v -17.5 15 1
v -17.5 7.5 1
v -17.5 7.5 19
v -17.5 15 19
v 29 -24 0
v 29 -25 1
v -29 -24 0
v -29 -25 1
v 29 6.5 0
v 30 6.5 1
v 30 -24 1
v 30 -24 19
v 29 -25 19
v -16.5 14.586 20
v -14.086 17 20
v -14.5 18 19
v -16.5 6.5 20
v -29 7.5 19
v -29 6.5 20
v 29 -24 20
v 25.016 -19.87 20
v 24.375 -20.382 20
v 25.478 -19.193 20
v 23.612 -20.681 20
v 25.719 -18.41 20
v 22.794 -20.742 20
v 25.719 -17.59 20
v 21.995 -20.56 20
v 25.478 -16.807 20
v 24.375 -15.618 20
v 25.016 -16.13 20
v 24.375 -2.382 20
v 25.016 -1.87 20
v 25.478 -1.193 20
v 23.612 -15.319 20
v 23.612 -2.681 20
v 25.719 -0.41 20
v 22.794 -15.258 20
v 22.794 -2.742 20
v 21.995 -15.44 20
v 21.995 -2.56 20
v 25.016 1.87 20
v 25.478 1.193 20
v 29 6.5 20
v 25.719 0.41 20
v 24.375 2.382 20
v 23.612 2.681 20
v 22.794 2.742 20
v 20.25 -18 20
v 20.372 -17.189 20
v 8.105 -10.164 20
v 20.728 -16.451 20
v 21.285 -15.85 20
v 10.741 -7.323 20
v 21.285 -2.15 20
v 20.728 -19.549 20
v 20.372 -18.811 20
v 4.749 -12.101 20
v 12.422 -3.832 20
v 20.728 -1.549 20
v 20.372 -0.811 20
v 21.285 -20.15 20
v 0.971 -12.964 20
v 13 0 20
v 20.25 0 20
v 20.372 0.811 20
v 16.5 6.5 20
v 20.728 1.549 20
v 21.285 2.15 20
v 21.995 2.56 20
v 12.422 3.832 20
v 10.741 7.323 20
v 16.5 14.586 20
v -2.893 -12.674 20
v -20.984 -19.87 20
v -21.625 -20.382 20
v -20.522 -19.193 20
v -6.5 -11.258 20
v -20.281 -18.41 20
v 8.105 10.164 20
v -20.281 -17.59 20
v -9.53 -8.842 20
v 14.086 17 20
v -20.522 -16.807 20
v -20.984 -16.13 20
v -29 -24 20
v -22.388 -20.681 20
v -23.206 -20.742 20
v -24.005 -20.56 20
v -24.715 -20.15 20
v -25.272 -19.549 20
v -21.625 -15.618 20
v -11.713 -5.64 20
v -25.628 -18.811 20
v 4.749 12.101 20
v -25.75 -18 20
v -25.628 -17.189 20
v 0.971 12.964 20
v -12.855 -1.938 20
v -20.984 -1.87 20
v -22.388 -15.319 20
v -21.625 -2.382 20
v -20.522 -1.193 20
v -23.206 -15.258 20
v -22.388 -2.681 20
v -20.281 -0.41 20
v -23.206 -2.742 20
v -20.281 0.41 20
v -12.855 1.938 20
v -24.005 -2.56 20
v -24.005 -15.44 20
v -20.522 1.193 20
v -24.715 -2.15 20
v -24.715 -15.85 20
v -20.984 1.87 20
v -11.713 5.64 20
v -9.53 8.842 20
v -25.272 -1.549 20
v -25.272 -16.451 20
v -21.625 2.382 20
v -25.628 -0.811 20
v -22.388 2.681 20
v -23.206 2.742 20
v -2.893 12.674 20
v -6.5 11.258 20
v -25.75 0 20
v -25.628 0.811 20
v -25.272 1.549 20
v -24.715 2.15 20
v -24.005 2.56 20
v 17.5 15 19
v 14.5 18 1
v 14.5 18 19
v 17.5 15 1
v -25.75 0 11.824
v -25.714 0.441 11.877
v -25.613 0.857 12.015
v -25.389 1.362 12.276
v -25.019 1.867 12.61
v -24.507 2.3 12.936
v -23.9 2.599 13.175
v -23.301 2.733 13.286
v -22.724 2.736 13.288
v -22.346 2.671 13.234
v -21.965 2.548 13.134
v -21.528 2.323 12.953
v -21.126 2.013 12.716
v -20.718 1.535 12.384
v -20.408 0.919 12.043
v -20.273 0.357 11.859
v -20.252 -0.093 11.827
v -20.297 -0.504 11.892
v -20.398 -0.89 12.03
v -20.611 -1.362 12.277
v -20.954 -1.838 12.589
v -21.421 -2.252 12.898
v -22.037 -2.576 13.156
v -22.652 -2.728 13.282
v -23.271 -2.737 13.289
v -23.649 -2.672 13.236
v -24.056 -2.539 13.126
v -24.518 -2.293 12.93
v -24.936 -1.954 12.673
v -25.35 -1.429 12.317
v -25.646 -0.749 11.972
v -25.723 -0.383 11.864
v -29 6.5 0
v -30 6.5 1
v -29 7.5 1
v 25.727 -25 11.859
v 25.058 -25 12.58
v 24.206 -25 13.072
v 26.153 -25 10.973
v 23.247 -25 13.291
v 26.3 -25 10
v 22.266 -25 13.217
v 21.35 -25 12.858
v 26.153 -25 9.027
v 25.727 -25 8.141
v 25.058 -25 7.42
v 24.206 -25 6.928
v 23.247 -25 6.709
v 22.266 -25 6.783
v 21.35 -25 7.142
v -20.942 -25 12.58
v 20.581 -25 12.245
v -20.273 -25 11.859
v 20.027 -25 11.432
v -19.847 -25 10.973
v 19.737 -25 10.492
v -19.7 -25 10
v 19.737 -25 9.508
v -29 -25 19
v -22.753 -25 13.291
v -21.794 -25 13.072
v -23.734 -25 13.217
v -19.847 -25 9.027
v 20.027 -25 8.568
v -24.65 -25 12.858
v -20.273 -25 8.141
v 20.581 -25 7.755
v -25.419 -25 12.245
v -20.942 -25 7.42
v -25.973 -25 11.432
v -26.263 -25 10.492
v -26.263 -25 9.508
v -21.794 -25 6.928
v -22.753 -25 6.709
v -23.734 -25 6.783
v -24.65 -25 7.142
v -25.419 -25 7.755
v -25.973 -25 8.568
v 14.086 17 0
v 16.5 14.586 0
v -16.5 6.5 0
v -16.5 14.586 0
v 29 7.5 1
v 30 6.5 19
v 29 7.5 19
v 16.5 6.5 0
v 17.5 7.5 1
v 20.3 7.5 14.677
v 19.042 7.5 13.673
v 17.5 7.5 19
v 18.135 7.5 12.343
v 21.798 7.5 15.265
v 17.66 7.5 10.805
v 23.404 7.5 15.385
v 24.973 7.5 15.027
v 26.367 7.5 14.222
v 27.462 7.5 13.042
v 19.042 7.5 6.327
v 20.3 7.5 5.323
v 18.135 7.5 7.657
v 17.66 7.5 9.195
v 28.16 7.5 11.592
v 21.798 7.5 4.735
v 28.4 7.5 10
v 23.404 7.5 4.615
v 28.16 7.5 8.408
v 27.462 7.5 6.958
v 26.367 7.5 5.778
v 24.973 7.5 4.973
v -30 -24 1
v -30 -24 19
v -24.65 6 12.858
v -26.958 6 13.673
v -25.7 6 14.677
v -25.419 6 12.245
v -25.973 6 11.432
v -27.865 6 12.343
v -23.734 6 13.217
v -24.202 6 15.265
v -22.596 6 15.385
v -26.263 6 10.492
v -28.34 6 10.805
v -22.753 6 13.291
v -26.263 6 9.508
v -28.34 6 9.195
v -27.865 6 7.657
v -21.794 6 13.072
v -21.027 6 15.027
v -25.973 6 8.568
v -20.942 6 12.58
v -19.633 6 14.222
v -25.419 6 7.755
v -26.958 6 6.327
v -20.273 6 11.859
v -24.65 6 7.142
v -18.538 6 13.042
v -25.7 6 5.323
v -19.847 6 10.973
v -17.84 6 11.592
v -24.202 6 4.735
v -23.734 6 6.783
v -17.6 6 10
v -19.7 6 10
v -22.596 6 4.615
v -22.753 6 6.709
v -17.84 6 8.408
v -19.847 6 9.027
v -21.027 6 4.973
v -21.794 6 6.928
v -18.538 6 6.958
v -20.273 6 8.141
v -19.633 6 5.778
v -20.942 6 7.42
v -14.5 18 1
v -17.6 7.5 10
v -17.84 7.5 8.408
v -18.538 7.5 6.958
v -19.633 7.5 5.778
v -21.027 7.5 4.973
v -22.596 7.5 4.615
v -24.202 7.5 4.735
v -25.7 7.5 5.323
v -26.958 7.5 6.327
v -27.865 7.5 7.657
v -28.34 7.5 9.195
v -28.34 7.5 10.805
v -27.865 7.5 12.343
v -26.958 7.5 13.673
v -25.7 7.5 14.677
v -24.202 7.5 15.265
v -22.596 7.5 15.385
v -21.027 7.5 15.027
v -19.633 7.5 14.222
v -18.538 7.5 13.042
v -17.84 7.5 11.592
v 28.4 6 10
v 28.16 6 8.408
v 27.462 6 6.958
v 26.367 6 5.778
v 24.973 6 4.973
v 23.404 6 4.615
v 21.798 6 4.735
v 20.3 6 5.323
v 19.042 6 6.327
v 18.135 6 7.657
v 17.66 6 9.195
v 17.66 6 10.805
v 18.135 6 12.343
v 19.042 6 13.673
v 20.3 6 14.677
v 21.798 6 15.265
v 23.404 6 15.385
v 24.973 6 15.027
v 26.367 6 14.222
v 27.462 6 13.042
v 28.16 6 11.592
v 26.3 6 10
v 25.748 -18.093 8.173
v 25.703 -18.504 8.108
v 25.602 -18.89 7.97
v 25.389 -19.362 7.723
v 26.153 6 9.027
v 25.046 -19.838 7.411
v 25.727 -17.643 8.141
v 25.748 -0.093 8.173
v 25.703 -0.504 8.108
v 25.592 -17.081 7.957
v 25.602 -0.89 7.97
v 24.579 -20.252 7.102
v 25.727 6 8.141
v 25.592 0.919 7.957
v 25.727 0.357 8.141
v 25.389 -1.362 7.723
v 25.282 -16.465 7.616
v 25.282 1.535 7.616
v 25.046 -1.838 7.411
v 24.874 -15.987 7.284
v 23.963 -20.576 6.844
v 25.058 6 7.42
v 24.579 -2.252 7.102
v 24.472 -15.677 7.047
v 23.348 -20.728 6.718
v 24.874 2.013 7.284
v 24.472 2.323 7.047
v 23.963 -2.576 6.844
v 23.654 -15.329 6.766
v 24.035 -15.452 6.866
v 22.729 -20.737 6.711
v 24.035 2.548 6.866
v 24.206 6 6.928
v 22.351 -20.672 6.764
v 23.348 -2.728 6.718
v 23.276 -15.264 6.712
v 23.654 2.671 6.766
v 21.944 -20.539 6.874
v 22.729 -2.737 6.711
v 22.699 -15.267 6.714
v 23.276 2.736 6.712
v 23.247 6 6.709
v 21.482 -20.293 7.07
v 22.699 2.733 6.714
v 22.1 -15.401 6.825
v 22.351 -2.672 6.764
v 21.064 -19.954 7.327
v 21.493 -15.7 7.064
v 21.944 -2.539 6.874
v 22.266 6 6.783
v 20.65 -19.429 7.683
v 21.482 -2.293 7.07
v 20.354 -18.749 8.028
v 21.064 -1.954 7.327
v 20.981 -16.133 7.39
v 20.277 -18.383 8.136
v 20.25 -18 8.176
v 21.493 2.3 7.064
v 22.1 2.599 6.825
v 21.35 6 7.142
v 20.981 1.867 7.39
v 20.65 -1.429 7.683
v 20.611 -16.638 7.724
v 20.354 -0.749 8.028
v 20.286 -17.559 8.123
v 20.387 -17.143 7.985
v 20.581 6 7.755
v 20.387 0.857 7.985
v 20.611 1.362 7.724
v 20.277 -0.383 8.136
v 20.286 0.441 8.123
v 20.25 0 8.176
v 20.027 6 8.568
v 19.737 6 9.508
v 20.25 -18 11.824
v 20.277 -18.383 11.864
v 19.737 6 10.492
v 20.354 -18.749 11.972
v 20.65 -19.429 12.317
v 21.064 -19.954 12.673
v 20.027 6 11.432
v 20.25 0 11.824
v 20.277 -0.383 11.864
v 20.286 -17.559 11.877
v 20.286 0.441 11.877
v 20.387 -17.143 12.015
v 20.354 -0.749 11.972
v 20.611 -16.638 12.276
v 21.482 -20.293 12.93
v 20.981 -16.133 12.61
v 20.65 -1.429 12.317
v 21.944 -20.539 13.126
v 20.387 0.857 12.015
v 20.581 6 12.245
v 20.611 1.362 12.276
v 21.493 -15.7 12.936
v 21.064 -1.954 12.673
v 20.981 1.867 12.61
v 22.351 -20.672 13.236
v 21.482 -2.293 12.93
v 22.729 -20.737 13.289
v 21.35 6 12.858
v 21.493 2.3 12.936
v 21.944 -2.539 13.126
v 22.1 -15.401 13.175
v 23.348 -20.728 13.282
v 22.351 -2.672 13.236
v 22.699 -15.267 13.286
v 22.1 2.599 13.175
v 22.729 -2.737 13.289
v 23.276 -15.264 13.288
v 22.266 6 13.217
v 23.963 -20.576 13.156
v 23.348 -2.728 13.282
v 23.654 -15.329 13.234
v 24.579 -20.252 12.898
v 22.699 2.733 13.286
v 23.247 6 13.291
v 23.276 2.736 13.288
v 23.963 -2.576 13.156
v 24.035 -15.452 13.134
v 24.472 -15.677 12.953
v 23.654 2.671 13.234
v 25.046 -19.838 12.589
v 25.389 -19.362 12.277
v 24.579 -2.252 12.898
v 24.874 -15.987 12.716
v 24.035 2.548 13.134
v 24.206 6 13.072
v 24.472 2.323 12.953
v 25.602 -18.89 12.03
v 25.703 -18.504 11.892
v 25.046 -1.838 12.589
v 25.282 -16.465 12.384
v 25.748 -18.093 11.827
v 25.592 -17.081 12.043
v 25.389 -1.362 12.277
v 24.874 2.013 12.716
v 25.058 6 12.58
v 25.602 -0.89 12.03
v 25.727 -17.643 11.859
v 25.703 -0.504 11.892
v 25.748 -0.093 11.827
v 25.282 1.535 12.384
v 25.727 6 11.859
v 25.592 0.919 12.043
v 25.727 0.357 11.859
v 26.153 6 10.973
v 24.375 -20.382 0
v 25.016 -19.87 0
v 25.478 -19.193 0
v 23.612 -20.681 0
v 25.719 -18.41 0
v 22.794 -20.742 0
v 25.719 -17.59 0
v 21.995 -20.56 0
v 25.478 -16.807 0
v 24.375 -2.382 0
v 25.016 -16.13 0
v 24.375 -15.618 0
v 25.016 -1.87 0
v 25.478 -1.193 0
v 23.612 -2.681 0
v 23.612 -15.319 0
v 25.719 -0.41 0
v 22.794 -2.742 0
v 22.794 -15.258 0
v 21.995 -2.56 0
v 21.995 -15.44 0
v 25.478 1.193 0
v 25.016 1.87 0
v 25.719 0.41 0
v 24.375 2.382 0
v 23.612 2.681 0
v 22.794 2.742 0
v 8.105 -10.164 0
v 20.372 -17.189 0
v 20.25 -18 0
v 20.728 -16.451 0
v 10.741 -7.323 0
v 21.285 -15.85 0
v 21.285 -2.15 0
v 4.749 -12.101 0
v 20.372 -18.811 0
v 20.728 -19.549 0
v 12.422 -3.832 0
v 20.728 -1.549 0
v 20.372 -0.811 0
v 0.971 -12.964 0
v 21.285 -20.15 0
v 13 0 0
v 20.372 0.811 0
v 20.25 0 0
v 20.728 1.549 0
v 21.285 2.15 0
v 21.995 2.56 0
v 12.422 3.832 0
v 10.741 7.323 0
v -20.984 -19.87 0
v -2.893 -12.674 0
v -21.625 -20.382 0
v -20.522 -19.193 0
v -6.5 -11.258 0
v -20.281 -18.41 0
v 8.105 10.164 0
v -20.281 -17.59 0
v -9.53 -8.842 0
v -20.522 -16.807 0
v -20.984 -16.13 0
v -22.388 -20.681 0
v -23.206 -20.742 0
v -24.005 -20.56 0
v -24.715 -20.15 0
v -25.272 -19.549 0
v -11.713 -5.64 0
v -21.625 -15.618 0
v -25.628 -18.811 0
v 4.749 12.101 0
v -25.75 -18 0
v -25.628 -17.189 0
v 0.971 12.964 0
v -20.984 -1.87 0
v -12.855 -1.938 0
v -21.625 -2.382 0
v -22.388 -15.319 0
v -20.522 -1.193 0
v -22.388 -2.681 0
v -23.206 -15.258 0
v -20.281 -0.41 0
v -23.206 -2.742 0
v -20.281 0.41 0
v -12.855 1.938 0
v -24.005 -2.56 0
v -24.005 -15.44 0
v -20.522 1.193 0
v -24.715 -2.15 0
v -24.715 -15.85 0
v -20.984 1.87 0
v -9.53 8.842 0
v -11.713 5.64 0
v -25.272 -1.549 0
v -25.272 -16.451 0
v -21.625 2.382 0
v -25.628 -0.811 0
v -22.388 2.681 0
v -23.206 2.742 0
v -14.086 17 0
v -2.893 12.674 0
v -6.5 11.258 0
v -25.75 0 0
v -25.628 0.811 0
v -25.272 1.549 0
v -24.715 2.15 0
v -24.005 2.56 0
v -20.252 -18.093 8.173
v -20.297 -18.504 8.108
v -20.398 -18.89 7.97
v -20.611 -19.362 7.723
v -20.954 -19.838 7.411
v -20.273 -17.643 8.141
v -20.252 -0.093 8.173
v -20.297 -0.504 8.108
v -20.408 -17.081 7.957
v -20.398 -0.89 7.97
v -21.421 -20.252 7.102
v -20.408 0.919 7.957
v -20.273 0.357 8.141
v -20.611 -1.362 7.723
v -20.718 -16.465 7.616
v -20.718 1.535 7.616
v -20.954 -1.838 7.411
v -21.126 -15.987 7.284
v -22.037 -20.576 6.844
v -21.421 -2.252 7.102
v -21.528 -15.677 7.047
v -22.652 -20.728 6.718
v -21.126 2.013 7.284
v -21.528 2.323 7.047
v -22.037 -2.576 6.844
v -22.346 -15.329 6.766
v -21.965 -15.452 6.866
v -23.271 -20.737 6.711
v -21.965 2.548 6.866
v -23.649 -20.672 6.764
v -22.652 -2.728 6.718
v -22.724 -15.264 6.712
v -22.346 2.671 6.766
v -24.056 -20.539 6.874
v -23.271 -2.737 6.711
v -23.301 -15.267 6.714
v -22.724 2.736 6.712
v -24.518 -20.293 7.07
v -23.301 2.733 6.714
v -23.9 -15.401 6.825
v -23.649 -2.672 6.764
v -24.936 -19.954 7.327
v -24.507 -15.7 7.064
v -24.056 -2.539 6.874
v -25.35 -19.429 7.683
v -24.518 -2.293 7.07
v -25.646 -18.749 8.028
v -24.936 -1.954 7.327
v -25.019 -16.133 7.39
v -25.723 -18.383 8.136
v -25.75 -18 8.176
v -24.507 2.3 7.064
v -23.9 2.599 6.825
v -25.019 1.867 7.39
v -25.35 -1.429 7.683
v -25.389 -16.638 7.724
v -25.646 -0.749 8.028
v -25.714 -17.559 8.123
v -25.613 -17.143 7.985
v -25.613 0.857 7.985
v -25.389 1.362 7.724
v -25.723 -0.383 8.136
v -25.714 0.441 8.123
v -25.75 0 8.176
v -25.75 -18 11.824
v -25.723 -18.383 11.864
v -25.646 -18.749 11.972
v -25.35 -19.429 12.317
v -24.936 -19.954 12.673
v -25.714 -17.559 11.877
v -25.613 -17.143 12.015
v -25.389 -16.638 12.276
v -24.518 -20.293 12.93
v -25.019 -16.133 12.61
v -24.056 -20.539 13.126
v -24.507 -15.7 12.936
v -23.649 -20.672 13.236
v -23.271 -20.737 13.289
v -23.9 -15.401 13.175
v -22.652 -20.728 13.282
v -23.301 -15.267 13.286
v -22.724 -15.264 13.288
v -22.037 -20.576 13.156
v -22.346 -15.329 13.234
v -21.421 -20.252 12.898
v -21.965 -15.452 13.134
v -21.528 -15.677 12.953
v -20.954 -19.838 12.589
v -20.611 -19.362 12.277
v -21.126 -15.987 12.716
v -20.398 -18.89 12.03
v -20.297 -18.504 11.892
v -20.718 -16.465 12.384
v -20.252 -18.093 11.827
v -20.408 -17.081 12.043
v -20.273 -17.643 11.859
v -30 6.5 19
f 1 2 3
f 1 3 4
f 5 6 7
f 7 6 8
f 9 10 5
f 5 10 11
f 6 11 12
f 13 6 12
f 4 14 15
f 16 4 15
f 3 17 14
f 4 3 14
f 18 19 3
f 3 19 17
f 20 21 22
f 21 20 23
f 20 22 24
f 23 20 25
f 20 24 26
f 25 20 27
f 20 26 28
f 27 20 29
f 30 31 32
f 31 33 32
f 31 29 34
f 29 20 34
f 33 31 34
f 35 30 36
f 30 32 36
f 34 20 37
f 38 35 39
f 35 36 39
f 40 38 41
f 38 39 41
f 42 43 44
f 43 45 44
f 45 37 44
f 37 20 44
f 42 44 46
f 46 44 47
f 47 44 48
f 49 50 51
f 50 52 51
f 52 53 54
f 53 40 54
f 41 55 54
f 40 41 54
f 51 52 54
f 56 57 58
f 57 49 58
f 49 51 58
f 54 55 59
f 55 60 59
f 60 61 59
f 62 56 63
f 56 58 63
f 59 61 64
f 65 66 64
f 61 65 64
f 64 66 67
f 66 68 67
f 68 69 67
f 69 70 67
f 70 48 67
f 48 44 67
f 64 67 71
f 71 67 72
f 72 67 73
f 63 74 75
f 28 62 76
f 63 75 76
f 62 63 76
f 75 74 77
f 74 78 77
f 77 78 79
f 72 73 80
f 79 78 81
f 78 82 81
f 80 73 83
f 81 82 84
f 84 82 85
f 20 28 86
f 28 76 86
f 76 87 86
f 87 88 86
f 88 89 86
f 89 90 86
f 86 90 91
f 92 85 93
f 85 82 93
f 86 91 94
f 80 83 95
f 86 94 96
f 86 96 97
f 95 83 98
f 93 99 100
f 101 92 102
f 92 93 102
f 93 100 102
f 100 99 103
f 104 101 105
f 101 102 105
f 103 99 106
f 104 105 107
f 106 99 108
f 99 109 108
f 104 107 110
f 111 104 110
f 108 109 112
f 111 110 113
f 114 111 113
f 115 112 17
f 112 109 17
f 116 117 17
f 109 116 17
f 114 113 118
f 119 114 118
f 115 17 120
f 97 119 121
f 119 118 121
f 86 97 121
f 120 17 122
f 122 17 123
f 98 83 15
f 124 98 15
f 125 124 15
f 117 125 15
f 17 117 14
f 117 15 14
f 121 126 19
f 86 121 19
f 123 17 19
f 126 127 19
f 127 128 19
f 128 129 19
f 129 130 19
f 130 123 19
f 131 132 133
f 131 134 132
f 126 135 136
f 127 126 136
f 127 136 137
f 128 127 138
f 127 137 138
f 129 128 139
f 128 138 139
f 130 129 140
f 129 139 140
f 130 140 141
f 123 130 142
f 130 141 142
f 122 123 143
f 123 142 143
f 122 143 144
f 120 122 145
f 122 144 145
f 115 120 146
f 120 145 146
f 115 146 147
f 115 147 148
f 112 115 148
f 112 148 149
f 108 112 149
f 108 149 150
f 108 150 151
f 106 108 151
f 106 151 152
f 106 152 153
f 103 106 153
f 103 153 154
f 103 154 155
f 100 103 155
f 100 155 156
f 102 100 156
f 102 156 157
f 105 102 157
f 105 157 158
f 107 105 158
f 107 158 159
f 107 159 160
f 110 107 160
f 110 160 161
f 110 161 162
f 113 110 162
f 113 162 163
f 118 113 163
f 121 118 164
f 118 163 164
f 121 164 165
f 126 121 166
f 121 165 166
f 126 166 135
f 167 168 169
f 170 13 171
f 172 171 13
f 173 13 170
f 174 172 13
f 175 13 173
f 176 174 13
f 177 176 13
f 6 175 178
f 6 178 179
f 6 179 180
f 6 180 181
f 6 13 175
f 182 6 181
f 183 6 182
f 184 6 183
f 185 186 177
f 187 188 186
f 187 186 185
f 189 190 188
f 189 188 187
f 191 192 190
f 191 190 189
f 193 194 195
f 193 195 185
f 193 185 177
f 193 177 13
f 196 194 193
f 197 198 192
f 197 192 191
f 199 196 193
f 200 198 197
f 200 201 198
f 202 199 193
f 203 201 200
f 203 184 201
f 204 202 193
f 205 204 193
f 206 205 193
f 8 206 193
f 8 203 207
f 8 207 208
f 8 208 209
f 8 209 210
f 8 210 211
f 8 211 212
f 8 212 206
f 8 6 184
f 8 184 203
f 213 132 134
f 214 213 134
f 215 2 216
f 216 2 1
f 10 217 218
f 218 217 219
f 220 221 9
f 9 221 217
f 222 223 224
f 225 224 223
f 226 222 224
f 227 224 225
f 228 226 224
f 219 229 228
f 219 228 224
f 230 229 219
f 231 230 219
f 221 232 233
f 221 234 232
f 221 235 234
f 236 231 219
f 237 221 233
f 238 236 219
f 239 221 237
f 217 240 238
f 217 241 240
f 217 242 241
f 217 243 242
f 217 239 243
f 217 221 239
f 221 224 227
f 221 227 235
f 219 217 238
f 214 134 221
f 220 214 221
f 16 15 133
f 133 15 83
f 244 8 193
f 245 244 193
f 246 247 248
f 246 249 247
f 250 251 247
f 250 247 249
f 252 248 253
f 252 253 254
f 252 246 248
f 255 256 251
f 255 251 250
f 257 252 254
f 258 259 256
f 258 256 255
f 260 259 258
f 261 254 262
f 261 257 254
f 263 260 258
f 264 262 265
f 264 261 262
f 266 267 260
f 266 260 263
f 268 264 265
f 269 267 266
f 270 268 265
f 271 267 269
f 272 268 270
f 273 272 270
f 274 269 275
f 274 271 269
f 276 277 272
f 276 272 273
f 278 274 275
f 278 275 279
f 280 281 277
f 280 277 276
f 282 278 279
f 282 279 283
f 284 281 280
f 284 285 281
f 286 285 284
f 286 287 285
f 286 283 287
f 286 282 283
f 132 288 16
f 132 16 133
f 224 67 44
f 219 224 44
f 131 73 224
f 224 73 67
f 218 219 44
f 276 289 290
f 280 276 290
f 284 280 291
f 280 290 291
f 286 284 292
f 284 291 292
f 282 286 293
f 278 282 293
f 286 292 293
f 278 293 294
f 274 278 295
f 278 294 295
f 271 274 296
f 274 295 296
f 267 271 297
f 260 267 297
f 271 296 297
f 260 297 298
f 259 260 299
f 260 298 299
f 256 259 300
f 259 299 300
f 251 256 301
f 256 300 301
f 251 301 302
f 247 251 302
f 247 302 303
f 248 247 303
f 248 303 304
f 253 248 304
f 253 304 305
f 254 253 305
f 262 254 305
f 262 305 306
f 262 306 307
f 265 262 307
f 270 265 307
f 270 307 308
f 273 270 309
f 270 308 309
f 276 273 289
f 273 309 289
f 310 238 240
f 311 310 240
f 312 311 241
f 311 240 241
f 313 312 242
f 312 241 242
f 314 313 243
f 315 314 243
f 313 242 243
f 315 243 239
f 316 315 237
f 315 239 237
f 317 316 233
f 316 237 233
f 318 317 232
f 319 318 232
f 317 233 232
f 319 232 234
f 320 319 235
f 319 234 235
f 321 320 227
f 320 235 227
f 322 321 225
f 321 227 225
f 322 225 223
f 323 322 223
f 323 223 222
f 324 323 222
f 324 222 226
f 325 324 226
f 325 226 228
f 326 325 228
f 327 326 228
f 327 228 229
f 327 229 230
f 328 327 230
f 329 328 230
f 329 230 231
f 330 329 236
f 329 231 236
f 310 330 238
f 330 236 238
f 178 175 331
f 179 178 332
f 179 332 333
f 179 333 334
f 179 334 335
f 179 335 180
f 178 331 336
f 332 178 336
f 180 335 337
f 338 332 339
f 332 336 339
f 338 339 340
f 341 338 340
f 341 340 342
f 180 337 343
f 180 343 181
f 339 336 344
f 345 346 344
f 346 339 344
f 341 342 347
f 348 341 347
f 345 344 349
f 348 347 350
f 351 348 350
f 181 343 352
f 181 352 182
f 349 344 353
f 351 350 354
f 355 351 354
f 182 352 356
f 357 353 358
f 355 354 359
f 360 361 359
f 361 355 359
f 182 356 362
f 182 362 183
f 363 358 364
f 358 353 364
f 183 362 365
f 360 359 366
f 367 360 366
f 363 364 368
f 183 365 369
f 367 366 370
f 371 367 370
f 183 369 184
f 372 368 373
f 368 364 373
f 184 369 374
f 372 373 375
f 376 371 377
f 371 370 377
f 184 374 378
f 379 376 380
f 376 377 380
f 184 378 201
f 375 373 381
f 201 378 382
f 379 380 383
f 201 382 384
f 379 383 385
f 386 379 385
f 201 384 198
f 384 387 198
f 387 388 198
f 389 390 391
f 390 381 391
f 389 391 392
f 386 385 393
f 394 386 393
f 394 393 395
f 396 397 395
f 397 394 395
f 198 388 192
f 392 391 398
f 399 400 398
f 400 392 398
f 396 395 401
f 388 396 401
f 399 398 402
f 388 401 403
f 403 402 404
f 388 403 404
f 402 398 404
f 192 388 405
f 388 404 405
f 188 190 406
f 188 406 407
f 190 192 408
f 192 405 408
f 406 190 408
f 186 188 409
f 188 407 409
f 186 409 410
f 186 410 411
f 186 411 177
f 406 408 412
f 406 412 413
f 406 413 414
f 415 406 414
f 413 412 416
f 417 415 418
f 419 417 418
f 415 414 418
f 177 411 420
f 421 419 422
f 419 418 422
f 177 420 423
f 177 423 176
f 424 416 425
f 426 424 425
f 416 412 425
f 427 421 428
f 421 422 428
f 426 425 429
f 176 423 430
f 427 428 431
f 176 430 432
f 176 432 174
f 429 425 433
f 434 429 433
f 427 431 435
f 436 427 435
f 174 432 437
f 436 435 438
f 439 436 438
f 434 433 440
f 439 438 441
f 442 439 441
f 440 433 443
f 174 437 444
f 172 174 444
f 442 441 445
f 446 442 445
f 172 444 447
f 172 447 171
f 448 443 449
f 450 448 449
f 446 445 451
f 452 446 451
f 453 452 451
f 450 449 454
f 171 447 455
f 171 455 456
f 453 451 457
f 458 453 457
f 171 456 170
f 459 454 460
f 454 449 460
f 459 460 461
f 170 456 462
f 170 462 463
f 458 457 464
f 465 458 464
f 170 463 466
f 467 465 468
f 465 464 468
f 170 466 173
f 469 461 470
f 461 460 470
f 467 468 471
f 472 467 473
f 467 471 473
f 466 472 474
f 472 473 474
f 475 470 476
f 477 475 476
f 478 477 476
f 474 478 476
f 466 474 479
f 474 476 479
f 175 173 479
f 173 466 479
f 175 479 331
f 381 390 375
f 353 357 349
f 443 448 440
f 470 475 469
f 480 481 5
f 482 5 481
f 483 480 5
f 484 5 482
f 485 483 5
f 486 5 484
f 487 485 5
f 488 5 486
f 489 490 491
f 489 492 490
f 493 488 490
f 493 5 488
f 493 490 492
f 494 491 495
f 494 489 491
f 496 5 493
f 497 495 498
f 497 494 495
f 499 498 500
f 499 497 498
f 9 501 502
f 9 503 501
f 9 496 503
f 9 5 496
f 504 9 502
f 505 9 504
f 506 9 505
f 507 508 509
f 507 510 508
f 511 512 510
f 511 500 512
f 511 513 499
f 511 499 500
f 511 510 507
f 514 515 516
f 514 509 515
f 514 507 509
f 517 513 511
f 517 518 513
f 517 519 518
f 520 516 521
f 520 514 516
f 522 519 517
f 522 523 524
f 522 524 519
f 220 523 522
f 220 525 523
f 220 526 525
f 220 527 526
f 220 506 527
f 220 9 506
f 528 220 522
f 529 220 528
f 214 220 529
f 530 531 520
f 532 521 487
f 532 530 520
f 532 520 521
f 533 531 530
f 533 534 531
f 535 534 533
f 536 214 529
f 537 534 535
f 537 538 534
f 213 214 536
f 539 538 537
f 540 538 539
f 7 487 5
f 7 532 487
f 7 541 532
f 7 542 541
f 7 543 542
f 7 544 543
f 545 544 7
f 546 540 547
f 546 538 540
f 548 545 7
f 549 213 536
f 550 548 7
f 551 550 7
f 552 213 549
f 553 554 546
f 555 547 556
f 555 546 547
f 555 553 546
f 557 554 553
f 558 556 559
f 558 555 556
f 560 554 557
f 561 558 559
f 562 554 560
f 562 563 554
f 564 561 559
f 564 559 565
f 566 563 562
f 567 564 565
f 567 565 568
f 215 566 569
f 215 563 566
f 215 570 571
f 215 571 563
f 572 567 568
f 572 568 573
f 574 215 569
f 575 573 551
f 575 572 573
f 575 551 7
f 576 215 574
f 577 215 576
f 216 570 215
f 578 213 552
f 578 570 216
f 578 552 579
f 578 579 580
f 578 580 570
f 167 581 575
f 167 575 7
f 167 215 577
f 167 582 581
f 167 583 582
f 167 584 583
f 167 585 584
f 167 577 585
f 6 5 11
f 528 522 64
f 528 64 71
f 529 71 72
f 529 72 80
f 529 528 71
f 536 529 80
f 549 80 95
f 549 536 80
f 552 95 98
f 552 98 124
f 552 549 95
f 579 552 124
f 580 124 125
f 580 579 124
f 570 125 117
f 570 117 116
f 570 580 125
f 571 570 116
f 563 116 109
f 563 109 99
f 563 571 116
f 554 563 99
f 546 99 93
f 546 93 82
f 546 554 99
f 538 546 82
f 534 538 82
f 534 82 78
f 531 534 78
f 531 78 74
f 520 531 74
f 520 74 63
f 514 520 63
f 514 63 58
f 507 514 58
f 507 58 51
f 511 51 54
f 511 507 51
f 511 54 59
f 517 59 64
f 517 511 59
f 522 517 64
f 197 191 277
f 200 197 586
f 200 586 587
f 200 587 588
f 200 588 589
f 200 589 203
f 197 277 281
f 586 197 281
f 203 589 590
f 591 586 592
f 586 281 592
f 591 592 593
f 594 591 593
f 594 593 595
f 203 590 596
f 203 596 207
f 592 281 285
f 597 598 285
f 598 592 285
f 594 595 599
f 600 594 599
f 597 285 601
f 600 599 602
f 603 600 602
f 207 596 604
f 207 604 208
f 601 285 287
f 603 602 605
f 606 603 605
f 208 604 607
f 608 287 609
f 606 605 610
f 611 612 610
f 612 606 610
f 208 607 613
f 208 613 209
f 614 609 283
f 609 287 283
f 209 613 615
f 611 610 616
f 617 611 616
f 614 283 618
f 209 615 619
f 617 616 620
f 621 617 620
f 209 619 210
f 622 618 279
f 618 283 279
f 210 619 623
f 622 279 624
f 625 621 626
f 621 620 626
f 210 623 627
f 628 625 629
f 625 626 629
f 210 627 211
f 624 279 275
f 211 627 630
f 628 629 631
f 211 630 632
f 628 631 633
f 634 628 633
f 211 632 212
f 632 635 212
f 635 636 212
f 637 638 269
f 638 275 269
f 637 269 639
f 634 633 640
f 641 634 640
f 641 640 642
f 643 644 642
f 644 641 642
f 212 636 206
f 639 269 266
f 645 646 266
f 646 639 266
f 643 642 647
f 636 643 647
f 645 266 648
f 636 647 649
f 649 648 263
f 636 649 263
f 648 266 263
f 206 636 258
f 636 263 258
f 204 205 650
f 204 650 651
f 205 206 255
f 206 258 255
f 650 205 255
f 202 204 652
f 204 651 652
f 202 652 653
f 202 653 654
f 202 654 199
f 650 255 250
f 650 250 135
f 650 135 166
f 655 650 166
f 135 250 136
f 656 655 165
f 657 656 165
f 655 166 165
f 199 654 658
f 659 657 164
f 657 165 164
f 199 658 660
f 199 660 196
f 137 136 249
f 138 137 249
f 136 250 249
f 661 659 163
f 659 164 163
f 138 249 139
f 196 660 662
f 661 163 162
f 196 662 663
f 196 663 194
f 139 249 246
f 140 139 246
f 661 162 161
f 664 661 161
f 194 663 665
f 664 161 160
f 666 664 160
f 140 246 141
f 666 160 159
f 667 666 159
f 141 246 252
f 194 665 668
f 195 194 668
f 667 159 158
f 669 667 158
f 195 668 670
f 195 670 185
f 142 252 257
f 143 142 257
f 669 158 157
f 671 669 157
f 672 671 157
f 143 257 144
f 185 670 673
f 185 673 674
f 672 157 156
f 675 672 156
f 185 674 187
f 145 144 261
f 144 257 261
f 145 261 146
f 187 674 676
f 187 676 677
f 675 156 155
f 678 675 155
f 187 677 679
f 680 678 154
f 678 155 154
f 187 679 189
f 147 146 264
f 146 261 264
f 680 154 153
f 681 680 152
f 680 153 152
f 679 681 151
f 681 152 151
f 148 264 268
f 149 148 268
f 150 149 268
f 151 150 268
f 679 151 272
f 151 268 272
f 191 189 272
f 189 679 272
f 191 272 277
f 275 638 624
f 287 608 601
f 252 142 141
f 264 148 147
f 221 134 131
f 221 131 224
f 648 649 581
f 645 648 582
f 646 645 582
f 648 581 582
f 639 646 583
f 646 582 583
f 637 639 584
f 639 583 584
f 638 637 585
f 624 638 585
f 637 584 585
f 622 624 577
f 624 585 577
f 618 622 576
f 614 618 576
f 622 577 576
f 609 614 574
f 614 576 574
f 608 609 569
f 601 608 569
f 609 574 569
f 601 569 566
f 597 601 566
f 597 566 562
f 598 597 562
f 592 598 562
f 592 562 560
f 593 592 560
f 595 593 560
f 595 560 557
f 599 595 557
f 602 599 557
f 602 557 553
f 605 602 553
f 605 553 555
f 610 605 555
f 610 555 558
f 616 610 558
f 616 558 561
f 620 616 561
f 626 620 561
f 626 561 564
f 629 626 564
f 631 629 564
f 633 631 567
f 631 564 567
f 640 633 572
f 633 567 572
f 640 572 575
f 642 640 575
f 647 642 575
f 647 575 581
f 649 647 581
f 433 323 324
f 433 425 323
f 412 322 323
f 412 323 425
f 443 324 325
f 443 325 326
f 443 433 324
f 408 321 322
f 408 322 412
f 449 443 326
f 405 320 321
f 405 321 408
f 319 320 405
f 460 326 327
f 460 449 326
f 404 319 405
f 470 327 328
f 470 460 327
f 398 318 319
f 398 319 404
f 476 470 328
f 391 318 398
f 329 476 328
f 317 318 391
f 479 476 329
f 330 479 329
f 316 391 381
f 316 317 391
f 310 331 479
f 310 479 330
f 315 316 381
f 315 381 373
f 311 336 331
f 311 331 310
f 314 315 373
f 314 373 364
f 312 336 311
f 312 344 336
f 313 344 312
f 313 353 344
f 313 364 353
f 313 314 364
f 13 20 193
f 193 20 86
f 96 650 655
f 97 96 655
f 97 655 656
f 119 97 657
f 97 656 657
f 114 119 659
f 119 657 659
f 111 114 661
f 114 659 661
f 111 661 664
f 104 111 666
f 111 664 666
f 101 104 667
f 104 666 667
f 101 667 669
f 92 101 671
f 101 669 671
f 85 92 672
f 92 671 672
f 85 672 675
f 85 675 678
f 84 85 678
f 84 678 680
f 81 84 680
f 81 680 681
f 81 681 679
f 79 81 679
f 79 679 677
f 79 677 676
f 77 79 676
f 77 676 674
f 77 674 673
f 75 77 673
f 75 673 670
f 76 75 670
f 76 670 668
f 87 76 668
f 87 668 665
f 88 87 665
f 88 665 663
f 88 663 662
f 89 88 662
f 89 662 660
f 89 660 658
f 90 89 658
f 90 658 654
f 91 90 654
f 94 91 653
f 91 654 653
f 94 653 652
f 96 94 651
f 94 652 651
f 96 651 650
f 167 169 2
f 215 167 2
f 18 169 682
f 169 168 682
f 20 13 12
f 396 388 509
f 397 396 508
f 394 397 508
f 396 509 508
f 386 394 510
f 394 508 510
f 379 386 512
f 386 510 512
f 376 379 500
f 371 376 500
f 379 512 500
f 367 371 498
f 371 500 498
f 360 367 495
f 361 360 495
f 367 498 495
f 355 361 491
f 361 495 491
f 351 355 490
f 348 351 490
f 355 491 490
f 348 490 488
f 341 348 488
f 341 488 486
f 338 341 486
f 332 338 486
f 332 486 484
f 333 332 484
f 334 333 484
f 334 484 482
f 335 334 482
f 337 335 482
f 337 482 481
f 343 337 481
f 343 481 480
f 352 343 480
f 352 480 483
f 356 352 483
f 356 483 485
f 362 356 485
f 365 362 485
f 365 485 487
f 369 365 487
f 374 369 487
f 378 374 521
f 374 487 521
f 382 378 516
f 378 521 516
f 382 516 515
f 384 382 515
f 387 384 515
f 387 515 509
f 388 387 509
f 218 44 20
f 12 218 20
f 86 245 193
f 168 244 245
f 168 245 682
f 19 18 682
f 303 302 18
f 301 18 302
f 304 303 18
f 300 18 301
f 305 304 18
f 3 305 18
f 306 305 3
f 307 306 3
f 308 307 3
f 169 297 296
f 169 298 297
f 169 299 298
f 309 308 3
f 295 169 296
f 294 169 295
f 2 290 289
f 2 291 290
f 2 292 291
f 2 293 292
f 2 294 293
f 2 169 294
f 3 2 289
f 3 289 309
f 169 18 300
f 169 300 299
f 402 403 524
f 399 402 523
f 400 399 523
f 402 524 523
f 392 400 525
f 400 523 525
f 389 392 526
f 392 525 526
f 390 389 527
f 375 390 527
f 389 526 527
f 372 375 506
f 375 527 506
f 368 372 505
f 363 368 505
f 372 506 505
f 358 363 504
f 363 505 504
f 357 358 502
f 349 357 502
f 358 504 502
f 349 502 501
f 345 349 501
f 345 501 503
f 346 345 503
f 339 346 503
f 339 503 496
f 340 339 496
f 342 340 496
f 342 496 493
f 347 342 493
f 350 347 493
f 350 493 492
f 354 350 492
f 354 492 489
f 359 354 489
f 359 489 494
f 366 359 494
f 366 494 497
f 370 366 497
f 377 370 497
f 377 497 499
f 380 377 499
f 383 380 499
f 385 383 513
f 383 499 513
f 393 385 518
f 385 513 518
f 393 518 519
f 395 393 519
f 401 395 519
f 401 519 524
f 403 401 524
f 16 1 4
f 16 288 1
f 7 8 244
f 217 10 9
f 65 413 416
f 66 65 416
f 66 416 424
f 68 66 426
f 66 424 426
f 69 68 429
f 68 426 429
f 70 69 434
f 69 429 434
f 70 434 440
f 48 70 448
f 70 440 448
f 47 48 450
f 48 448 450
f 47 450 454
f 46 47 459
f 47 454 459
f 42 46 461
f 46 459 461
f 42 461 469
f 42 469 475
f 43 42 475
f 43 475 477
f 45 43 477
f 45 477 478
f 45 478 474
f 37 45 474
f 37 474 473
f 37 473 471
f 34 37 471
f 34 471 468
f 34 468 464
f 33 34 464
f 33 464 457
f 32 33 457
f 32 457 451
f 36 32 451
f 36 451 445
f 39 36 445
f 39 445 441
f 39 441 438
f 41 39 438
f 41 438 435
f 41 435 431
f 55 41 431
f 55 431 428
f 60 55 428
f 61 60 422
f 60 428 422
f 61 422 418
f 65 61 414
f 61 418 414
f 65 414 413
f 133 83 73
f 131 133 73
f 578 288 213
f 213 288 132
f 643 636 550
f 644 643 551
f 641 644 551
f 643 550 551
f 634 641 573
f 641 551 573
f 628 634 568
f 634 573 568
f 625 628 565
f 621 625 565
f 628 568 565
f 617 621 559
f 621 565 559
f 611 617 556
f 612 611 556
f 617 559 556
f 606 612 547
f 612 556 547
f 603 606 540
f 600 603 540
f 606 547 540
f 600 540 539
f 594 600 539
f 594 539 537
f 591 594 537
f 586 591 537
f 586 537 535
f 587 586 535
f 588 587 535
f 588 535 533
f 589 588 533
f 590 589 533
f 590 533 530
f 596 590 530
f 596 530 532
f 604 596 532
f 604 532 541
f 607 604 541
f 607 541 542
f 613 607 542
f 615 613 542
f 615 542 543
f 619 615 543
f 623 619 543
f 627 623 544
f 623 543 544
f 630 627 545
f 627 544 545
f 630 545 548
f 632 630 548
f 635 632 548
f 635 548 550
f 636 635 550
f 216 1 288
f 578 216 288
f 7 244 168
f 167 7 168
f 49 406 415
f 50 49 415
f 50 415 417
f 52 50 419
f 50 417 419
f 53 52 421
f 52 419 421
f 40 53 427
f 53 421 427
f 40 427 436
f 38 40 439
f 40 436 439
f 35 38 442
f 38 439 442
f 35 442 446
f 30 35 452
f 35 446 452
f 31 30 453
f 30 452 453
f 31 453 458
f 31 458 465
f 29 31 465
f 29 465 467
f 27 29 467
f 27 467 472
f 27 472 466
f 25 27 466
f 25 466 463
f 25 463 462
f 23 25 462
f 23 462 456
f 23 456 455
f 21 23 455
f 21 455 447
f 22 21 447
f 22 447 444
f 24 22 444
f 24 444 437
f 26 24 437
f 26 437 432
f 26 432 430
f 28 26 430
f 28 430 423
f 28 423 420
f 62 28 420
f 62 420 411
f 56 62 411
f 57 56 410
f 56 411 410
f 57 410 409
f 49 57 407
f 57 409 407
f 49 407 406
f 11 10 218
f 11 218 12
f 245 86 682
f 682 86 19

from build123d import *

# Parameters (mm, degrees)
ESBO_O1_R                = 13
RESSALTO_EXTRUS_O1_DEPTH = 20
ESBO_O4_R                = 3.3
CORTE_EXTRUS_O1_DEPTH    = 33.5
CHANFRO1_SIZE            = 3
CHANFRO3_SIZE            = 1
ESBO_O5_R                = 5.4
CORTE_EXTRUS_O2_DEPTH    = 1.5
ESBO_O6_R                = 2.75
CORTE_EXTRUS_O3_DEPTH    = 21


with BuildPart() as part:
    # Esboço1 → Ressalto-extrusão1 (new body)
    with BuildSketch(Plane.XY):
        Polygon((-30, -25), (-30, 7.5), (-17.5, 7.5), (-17.5, 18), (17.5, 18), (17.5, 7.5), (30, 7.5), (30, -25), align=None)
        Circle(ESBO_O1_R, mode=Mode.SUBTRACT)
    extrude(amount=RESSALTO_EXTRUS_O1_DEPTH)

    # Esboço4 → Corte-extrusão1 (cut, through all)
    with BuildSketch(Plane(origin=(0, 7.5, 0), x_dir=(1, 0, 0), z_dir=(0, 1, 0))):
        with Locations((-23, -10)):
            Circle(ESBO_O4_R)
        with Locations((23, -10)):
            Circle(ESBO_O4_R)
    extrude(amount=-CORTE_EXTRUS_O1_DEPTH, mode=Mode.SUBTRACT)

    # Chanfro1
    chanfro1_edges = [part.edges().sort_by_distance(p)[0] for p in [
        (-17.5, 18, 10),
        (17.5, 18, 10),
    ]]
    chamfer(chanfro1_edges, length=CHANFRO1_SIZE)

    # Chanfro3
    chanfro3_edges = [part.edges().sort_by_distance(p)[0] for p in [
        (23.75, 7.5, 20),
        (30, -8.75, 0),
        (0, -25, 0),
        (17.5, 11.25, 20),
        (-30, -25, 10),
        (-30, 7.5, 10),
        (30, 7.5, 10),
        (30, -25, 10),
        (-23.75, 7.5, 20),
        (-30, -8.75, 20),
        (0, 18, 0),
        (0, 18, 20),
        (-17.5, 11.25, 0),
        (-16, 16.5, 0),
        (0, -25, 20),
        (16, 16.5, 0),
        (-17.5, 11.25, 20),
        (-16, 16.5, 20),
        (16, 16.5, 20),
        (30, -8.75, 20),
        (-30, -8.75, 0),
        (-23.75, 7.5, 0),
        (17.5, 11.25, 0),
        (23.75, 7.5, 0),
    ]]
    chamfer(chanfro3_edges, length=CHANFRO3_SIZE)

    # Esboço5 → Corte-extrusão2 (cut)
    with BuildSketch(Plane(origin=(0, 7.5, 0), x_dir=(1, 0, 0), z_dir=(0, 1, 0))):
        with Locations((23, -10)):
            Circle(ESBO_O5_R)
        with Locations((-23, -10)):
            Circle(ESBO_O5_R)
    extrude(amount=-CORTE_EXTRUS_O2_DEPTH, mode=Mode.SUBTRACT)

    # Esboço6 → Corte-extrusão3 (cut, through all)
    with BuildSketch(Plane(origin=(0, 0, 0), x_dir=(-1, 0, 0), z_dir=(0, 0, -1))):
        with Locations((-23, 0)):
            Circle(ESBO_O6_R)
        with Locations((-23, -18)):
            Circle(ESBO_O6_R)
        with Locations((23, 0)):
            Circle(ESBO_O6_R)
        with Locations((23, -18)):
            Circle(ESBO_O6_R)
    extrude(amount=-CORTE_EXTRUS_O3_DEPTH, mode=Mode.SUBTRACT)


solid = part.part
